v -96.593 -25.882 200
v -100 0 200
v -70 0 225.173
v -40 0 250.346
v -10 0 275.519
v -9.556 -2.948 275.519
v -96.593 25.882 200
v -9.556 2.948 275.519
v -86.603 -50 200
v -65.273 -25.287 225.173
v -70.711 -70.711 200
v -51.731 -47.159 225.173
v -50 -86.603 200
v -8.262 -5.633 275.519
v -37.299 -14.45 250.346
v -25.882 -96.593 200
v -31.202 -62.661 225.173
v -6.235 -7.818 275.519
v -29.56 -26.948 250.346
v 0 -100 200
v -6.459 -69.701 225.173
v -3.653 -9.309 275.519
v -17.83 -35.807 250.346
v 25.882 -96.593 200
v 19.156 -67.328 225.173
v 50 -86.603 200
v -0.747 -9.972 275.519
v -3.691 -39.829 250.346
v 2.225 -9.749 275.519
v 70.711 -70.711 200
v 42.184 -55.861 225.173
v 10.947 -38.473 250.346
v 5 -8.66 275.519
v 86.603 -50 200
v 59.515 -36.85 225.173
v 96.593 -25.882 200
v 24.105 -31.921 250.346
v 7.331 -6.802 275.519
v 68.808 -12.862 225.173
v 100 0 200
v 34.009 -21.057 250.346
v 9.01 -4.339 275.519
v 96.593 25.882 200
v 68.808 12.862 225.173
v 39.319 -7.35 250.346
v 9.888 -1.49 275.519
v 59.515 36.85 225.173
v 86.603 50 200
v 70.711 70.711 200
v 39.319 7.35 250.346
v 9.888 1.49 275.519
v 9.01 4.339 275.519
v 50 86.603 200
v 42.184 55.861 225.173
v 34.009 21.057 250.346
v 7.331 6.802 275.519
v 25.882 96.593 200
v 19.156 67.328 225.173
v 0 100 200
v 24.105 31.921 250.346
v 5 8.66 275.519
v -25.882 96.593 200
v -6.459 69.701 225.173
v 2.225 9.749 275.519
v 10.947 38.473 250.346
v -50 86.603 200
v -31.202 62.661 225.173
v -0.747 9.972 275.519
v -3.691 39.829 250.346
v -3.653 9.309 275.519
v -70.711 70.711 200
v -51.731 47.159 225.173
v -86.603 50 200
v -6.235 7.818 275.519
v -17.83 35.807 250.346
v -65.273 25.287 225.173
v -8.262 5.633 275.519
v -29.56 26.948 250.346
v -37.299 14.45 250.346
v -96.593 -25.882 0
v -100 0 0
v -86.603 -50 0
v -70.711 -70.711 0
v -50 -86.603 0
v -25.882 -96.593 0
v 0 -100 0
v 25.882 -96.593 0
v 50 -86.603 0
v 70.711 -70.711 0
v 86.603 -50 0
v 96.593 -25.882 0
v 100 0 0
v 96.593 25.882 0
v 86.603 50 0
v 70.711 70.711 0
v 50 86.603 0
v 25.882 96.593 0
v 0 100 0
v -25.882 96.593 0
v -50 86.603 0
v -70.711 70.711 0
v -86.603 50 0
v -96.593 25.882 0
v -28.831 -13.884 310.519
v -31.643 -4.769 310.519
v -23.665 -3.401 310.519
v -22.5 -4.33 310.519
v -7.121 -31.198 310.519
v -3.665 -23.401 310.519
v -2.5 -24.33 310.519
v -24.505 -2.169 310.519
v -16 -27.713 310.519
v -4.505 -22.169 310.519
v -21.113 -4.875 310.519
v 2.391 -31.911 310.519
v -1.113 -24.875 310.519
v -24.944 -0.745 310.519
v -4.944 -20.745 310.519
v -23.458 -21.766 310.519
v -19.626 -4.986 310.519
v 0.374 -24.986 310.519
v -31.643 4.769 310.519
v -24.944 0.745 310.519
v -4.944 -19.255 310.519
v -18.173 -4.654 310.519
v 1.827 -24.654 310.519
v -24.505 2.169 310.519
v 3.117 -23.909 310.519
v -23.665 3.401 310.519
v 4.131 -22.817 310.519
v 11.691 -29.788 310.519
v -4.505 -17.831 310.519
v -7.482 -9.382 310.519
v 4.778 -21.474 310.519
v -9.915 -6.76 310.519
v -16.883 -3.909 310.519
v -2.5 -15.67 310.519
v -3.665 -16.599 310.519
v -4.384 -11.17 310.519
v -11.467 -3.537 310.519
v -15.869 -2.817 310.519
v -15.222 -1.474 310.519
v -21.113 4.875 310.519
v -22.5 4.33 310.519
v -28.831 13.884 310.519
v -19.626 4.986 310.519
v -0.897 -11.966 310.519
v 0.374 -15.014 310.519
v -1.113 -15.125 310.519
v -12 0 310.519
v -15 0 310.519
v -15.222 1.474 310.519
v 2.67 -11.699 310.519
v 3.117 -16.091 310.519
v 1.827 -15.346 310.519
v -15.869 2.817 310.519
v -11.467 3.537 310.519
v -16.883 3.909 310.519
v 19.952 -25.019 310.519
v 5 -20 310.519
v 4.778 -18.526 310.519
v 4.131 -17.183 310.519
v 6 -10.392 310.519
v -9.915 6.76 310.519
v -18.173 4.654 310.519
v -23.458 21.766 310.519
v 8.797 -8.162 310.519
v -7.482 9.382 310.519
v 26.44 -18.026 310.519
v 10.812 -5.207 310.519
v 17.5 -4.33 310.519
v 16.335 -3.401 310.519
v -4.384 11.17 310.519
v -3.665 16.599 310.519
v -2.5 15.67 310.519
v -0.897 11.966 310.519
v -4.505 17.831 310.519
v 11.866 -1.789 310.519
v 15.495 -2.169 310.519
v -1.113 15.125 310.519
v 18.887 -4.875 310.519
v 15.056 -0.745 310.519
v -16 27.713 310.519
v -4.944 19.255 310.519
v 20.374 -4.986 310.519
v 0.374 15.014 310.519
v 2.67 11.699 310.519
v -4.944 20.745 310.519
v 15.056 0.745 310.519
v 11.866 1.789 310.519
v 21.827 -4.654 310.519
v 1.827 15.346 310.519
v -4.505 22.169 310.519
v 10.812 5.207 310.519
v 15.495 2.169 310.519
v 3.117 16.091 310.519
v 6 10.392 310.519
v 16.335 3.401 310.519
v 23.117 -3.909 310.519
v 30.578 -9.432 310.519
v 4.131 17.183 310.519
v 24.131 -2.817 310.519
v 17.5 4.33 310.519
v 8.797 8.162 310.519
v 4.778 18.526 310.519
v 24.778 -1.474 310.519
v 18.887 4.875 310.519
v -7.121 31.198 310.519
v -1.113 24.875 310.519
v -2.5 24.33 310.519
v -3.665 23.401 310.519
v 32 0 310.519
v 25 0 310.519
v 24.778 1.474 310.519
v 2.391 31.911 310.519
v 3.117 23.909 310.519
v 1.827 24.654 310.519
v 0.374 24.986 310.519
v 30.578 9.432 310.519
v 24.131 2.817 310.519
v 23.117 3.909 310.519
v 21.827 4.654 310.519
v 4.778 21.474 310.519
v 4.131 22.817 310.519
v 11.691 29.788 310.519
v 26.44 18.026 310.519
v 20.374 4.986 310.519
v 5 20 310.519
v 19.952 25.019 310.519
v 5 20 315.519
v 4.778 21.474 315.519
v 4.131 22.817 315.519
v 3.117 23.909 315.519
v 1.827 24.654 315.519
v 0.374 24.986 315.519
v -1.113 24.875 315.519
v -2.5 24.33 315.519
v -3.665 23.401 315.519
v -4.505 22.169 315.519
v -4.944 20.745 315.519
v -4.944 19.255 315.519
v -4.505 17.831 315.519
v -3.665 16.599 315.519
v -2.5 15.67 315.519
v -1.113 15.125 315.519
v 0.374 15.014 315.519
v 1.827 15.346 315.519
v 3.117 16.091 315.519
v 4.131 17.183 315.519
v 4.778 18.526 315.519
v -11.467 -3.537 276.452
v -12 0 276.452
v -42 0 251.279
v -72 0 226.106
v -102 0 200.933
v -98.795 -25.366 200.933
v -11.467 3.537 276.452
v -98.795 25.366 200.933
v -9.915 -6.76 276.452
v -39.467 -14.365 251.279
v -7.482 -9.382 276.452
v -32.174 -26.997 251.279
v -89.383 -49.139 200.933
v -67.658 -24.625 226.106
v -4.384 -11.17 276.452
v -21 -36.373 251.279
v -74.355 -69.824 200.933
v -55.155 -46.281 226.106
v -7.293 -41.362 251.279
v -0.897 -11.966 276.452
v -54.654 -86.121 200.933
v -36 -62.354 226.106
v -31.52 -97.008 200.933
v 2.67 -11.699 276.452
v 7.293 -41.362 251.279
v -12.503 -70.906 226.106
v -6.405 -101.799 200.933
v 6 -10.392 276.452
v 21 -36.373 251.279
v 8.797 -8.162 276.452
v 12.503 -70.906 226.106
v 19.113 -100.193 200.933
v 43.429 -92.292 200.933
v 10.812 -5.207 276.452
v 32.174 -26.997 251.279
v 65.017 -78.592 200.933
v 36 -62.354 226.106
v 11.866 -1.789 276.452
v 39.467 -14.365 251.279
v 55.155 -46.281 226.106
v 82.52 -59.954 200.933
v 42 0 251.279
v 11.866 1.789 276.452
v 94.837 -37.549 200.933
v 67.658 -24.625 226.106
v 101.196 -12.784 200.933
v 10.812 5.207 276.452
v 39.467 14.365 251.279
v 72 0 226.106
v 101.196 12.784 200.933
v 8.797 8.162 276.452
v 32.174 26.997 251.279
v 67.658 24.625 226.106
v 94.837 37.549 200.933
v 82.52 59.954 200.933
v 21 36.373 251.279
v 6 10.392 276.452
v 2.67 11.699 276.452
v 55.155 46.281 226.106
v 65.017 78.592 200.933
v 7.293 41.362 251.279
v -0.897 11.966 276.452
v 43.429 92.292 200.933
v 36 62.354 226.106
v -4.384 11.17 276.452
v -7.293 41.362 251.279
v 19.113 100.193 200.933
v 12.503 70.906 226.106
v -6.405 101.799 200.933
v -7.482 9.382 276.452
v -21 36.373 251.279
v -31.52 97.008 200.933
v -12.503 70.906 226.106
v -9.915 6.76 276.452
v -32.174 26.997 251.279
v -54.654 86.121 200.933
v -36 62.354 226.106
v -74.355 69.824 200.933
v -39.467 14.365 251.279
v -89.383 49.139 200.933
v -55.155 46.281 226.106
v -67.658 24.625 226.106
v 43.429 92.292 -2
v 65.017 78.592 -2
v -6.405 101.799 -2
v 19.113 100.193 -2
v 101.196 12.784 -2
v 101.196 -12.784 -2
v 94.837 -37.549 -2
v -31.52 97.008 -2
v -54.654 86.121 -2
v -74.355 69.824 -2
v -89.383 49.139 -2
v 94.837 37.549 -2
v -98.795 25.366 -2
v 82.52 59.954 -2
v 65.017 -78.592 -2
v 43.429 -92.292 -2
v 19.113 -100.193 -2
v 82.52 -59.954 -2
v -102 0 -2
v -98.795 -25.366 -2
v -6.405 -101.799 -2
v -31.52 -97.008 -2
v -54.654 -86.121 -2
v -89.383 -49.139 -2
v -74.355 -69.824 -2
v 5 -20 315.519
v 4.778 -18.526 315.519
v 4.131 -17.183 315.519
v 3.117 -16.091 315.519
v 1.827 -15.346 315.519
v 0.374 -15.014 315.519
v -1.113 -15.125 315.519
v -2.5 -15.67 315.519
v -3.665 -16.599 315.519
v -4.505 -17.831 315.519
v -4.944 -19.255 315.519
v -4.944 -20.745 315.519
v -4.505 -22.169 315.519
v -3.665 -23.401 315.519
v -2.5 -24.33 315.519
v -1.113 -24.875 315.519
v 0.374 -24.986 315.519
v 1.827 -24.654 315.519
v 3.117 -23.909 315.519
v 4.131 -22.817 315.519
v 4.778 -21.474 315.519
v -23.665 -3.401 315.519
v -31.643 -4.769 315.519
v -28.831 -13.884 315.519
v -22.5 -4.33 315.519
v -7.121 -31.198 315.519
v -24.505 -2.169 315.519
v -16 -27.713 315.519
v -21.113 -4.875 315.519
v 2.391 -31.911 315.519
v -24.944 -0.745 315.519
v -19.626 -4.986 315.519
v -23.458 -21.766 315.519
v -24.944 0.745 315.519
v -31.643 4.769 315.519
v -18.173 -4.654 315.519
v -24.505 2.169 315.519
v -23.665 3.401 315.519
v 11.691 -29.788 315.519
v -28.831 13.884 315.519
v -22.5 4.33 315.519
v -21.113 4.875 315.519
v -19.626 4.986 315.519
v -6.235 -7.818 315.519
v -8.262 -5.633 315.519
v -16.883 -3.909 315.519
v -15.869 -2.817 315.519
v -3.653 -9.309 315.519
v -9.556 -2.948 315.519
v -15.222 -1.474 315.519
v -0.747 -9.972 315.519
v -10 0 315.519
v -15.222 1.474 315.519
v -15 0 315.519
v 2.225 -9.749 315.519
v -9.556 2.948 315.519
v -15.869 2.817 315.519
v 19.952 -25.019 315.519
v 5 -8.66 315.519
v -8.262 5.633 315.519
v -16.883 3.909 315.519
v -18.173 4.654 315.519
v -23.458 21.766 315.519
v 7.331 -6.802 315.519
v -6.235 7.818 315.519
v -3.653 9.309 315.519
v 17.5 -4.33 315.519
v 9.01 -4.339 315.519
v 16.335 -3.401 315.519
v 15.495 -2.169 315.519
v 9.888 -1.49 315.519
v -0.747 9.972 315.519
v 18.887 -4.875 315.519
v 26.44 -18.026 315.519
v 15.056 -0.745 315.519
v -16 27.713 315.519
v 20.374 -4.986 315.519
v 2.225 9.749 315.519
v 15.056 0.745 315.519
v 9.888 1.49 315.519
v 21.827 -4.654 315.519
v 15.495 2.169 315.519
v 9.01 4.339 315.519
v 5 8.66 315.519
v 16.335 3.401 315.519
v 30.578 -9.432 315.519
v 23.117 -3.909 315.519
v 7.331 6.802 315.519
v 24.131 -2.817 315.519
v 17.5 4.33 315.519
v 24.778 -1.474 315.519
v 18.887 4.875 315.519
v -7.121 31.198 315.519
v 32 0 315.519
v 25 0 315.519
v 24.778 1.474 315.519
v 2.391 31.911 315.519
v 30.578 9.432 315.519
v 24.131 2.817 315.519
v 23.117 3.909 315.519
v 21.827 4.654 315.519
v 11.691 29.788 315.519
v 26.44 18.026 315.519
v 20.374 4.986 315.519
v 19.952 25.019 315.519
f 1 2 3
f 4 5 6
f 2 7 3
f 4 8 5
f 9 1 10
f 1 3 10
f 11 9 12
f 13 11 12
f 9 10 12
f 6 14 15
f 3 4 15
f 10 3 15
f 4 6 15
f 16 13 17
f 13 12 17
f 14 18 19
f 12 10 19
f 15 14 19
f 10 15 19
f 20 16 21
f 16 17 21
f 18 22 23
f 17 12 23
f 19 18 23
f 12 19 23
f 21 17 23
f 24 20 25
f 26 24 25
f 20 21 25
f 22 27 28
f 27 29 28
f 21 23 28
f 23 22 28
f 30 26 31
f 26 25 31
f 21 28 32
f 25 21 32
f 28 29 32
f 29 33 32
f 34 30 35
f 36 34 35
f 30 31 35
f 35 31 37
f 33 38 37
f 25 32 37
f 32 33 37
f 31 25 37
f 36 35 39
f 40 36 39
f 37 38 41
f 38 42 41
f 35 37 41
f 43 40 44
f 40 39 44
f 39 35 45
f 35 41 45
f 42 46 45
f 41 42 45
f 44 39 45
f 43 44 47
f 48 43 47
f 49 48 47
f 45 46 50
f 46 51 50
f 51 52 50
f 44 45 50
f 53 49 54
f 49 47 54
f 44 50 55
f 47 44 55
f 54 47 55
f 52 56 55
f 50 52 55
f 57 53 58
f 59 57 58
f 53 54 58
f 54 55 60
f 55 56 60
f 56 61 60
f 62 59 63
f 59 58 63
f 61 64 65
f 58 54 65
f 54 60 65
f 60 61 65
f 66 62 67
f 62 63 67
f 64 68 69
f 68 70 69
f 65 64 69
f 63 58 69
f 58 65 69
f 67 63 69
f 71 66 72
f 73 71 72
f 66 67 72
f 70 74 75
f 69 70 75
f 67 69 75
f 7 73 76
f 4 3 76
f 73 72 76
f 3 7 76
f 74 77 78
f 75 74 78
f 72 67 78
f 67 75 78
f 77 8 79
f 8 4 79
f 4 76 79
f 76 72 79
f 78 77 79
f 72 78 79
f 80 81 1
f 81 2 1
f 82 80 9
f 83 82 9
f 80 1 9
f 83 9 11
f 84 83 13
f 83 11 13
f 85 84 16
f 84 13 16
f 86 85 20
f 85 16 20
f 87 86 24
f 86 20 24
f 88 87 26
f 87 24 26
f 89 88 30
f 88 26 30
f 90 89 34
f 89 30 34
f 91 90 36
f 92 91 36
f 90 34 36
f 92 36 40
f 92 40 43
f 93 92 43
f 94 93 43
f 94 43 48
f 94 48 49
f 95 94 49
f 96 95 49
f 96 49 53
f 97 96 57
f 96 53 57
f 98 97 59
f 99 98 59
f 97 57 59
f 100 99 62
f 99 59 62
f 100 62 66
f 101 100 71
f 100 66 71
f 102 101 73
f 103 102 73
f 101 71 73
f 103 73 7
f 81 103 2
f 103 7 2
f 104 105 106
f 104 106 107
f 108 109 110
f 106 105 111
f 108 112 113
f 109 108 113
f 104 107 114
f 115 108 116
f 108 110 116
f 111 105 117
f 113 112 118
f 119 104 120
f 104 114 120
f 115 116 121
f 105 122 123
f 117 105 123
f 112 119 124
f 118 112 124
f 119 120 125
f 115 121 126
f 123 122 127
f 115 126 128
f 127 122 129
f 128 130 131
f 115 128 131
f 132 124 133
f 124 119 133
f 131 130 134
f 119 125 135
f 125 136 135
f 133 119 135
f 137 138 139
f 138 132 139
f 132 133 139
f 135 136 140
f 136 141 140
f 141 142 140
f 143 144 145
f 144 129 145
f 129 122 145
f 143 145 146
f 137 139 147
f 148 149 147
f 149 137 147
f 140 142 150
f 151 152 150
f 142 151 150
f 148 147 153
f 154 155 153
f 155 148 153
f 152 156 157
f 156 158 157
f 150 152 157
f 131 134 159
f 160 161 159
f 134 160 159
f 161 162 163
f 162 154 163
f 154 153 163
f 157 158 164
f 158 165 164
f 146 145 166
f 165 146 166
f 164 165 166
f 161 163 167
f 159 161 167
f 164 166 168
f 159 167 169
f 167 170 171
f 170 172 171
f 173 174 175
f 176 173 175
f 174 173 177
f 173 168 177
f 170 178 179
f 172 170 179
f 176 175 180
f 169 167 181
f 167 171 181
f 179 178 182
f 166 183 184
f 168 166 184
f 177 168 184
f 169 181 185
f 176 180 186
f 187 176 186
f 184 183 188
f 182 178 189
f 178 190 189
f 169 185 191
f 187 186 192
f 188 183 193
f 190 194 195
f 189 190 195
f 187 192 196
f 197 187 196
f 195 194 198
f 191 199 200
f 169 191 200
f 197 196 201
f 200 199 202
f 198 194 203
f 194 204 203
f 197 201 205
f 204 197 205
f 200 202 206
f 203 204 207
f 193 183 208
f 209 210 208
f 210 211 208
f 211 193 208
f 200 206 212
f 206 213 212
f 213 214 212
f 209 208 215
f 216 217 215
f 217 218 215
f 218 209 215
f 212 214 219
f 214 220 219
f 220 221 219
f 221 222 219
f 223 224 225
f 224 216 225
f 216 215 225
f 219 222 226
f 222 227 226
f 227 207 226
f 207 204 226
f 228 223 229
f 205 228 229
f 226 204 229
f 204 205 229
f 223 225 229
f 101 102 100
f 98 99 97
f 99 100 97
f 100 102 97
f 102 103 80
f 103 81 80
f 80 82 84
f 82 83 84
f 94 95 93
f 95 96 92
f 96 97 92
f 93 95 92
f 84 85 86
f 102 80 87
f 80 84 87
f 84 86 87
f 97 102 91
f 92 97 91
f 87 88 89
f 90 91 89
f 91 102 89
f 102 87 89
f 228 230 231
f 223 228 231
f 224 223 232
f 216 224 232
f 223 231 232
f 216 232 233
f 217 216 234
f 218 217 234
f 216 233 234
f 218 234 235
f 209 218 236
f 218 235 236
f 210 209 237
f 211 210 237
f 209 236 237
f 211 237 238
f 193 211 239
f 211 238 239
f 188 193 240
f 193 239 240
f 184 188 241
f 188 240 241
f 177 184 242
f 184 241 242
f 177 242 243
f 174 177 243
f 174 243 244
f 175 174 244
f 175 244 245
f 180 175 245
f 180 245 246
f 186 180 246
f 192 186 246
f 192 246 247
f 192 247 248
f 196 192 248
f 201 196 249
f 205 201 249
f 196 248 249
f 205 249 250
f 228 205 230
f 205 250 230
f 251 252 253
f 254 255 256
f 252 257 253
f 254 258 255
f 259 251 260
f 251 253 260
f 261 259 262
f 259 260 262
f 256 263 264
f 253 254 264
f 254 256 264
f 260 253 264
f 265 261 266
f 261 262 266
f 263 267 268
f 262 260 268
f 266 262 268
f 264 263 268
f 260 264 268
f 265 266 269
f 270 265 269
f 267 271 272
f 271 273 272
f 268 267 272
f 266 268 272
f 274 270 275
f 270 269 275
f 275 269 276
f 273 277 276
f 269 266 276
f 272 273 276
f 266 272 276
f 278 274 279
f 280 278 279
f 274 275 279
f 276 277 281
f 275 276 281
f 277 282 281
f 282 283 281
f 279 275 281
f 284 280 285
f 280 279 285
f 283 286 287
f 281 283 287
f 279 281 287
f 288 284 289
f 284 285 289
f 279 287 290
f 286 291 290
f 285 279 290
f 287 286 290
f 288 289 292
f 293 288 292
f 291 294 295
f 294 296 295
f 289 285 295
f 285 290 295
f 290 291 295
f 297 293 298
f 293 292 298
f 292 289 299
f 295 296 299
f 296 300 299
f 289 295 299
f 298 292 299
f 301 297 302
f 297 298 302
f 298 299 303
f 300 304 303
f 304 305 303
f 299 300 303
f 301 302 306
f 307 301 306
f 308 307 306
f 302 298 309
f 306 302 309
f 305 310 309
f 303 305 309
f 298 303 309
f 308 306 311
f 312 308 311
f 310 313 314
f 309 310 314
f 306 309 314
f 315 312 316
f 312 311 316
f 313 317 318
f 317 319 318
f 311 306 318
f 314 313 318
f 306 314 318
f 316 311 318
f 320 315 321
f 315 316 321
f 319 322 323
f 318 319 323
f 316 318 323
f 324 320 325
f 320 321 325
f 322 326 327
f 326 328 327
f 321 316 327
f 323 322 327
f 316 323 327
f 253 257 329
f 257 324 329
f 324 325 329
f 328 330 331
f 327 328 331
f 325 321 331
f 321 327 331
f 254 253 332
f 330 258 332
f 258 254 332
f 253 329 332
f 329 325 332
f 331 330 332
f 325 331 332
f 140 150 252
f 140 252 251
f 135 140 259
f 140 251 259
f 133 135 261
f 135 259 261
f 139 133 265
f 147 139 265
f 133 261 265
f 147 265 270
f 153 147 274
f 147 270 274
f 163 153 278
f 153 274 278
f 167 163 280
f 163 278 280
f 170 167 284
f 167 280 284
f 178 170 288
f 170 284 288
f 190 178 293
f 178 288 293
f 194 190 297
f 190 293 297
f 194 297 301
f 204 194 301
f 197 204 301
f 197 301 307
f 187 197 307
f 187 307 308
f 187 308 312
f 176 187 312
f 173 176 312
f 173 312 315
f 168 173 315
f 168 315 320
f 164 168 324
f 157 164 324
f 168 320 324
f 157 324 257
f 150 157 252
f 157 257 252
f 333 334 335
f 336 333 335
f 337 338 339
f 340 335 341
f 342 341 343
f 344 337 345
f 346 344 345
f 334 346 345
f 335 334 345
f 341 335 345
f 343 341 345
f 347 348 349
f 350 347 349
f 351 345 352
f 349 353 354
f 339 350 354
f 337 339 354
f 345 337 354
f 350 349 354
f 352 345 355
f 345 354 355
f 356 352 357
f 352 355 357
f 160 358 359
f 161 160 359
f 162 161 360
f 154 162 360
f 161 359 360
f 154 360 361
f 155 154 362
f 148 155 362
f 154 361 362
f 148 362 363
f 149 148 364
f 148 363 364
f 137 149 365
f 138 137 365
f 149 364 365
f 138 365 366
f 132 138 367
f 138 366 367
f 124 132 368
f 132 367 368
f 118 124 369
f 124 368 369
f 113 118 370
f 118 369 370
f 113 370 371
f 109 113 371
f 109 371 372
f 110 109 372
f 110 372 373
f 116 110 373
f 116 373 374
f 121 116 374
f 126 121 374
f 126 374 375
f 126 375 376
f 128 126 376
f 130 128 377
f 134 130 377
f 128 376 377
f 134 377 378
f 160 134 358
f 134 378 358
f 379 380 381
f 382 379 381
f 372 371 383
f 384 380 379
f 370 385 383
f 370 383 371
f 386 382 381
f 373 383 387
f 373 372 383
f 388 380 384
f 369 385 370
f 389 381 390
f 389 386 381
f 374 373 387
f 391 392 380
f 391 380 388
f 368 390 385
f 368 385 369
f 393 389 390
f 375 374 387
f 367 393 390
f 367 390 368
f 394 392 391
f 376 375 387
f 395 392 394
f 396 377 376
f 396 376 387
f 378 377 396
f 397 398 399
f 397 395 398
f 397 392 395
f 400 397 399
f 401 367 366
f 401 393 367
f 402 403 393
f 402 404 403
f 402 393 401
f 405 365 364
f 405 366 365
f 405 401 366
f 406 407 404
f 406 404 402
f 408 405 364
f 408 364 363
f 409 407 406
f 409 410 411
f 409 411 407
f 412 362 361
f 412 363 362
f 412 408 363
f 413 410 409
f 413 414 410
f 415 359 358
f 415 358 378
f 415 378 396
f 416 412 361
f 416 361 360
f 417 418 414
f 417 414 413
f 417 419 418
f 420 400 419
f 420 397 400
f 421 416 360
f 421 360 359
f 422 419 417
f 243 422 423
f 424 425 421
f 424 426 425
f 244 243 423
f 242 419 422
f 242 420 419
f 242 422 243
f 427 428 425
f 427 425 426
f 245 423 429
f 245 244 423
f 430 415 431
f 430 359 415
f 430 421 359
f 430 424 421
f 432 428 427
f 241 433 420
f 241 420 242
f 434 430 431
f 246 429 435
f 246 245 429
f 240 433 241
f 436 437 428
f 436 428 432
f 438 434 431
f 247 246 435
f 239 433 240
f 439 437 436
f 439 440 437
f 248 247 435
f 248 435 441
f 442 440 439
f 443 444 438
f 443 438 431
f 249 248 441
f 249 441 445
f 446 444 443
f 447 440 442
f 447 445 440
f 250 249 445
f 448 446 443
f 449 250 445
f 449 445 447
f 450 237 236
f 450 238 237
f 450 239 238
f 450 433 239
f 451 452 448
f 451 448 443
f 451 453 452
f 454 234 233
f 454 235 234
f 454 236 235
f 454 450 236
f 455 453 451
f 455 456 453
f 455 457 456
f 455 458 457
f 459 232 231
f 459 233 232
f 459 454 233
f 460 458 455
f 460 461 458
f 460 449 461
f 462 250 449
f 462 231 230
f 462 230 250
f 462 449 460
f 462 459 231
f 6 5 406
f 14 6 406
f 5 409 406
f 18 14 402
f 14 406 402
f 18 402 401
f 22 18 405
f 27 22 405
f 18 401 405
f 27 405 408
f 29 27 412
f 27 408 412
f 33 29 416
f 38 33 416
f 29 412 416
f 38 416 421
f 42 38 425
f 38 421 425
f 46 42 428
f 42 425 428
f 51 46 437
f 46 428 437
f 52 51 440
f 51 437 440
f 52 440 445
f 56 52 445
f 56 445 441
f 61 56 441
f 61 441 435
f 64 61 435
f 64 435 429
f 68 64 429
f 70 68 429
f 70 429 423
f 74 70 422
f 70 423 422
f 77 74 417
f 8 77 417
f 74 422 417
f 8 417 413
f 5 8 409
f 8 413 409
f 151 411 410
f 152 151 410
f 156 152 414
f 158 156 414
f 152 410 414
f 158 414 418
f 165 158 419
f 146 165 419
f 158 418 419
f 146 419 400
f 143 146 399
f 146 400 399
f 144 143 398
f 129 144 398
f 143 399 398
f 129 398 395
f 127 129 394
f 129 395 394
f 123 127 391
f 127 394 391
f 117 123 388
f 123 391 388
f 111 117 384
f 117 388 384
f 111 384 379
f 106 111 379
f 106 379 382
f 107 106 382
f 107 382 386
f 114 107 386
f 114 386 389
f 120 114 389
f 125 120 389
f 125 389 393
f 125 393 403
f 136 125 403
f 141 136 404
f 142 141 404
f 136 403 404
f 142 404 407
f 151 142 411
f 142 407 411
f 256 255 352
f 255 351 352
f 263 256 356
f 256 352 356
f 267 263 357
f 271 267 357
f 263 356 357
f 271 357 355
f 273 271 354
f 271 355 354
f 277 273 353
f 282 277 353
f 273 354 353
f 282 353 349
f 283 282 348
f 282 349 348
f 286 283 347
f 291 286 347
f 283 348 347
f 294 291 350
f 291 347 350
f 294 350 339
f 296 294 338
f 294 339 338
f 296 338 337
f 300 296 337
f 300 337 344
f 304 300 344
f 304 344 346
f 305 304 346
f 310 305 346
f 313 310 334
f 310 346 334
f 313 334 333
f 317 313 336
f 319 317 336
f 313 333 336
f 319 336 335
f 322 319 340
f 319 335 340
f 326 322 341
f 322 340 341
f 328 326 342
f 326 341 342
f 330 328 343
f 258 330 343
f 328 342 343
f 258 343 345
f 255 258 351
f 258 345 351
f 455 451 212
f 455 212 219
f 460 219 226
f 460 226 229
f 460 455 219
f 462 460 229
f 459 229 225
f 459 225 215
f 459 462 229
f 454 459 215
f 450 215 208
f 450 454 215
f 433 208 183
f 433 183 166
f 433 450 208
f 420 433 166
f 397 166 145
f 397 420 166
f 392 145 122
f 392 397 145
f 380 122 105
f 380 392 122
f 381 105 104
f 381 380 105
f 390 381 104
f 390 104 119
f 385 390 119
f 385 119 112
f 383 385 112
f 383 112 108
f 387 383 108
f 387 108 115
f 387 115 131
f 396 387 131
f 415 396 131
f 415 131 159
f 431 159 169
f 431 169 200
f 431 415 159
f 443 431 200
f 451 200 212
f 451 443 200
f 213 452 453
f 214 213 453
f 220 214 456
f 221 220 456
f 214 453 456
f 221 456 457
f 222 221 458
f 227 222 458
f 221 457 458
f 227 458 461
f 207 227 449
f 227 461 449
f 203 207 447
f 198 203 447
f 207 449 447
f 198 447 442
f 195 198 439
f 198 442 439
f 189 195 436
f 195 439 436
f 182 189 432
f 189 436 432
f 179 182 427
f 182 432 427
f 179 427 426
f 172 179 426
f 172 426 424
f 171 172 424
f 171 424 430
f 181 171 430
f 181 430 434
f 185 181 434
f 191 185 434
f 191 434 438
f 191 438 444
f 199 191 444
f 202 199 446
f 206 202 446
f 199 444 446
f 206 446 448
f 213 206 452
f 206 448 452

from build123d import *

# Parameters (mm, degrees)
F2_R     = 32
F2_R_2   = 12
F3_DEPTH = 5
F4_R     = 5
F5_DEPTH = 5


with BuildPart() as f1:
    # F0 (on Front) → F1 (revolve)
    with BuildSketch(Plane.XZ):
        Polygon((-100, 0), (-100, 200), (-10, 275.518966806), (-10, 315.518966806), (-12, 315.518966806), (-12, 276.4515821223), (-102, 200.9326153163), (-102, -2), (0, -2), (0, 0), align=None)
    revolve(axis=Axis((0, 0, 120), (0, 0, 1)))

    # F2 (on face) → F3 (join)
    with BuildSketch(Plane.XY.offset(315.518966806)):
        Circle(F2_R)
        Circle(F2_R_2, mode=Mode.SUBTRACT)
    extrude(amount=-F3_DEPTH)

    # F4 (on face) → F5 (cut, through all)
    with BuildSketch(Plane.XY.offset(315.518966806)):
        with Locations((0, 20)):
            Circle(F4_R)
        with Locations((-20, 0)):
            Circle(F4_R)
        with Locations((0, -20)):
            Circle(F4_R)
        with Locations((20, 0)):
            Circle(F4_R)
    extrude(amount=-F5_DEPTH, mode=Mode.SUBTRACT)


solid = f1.part
